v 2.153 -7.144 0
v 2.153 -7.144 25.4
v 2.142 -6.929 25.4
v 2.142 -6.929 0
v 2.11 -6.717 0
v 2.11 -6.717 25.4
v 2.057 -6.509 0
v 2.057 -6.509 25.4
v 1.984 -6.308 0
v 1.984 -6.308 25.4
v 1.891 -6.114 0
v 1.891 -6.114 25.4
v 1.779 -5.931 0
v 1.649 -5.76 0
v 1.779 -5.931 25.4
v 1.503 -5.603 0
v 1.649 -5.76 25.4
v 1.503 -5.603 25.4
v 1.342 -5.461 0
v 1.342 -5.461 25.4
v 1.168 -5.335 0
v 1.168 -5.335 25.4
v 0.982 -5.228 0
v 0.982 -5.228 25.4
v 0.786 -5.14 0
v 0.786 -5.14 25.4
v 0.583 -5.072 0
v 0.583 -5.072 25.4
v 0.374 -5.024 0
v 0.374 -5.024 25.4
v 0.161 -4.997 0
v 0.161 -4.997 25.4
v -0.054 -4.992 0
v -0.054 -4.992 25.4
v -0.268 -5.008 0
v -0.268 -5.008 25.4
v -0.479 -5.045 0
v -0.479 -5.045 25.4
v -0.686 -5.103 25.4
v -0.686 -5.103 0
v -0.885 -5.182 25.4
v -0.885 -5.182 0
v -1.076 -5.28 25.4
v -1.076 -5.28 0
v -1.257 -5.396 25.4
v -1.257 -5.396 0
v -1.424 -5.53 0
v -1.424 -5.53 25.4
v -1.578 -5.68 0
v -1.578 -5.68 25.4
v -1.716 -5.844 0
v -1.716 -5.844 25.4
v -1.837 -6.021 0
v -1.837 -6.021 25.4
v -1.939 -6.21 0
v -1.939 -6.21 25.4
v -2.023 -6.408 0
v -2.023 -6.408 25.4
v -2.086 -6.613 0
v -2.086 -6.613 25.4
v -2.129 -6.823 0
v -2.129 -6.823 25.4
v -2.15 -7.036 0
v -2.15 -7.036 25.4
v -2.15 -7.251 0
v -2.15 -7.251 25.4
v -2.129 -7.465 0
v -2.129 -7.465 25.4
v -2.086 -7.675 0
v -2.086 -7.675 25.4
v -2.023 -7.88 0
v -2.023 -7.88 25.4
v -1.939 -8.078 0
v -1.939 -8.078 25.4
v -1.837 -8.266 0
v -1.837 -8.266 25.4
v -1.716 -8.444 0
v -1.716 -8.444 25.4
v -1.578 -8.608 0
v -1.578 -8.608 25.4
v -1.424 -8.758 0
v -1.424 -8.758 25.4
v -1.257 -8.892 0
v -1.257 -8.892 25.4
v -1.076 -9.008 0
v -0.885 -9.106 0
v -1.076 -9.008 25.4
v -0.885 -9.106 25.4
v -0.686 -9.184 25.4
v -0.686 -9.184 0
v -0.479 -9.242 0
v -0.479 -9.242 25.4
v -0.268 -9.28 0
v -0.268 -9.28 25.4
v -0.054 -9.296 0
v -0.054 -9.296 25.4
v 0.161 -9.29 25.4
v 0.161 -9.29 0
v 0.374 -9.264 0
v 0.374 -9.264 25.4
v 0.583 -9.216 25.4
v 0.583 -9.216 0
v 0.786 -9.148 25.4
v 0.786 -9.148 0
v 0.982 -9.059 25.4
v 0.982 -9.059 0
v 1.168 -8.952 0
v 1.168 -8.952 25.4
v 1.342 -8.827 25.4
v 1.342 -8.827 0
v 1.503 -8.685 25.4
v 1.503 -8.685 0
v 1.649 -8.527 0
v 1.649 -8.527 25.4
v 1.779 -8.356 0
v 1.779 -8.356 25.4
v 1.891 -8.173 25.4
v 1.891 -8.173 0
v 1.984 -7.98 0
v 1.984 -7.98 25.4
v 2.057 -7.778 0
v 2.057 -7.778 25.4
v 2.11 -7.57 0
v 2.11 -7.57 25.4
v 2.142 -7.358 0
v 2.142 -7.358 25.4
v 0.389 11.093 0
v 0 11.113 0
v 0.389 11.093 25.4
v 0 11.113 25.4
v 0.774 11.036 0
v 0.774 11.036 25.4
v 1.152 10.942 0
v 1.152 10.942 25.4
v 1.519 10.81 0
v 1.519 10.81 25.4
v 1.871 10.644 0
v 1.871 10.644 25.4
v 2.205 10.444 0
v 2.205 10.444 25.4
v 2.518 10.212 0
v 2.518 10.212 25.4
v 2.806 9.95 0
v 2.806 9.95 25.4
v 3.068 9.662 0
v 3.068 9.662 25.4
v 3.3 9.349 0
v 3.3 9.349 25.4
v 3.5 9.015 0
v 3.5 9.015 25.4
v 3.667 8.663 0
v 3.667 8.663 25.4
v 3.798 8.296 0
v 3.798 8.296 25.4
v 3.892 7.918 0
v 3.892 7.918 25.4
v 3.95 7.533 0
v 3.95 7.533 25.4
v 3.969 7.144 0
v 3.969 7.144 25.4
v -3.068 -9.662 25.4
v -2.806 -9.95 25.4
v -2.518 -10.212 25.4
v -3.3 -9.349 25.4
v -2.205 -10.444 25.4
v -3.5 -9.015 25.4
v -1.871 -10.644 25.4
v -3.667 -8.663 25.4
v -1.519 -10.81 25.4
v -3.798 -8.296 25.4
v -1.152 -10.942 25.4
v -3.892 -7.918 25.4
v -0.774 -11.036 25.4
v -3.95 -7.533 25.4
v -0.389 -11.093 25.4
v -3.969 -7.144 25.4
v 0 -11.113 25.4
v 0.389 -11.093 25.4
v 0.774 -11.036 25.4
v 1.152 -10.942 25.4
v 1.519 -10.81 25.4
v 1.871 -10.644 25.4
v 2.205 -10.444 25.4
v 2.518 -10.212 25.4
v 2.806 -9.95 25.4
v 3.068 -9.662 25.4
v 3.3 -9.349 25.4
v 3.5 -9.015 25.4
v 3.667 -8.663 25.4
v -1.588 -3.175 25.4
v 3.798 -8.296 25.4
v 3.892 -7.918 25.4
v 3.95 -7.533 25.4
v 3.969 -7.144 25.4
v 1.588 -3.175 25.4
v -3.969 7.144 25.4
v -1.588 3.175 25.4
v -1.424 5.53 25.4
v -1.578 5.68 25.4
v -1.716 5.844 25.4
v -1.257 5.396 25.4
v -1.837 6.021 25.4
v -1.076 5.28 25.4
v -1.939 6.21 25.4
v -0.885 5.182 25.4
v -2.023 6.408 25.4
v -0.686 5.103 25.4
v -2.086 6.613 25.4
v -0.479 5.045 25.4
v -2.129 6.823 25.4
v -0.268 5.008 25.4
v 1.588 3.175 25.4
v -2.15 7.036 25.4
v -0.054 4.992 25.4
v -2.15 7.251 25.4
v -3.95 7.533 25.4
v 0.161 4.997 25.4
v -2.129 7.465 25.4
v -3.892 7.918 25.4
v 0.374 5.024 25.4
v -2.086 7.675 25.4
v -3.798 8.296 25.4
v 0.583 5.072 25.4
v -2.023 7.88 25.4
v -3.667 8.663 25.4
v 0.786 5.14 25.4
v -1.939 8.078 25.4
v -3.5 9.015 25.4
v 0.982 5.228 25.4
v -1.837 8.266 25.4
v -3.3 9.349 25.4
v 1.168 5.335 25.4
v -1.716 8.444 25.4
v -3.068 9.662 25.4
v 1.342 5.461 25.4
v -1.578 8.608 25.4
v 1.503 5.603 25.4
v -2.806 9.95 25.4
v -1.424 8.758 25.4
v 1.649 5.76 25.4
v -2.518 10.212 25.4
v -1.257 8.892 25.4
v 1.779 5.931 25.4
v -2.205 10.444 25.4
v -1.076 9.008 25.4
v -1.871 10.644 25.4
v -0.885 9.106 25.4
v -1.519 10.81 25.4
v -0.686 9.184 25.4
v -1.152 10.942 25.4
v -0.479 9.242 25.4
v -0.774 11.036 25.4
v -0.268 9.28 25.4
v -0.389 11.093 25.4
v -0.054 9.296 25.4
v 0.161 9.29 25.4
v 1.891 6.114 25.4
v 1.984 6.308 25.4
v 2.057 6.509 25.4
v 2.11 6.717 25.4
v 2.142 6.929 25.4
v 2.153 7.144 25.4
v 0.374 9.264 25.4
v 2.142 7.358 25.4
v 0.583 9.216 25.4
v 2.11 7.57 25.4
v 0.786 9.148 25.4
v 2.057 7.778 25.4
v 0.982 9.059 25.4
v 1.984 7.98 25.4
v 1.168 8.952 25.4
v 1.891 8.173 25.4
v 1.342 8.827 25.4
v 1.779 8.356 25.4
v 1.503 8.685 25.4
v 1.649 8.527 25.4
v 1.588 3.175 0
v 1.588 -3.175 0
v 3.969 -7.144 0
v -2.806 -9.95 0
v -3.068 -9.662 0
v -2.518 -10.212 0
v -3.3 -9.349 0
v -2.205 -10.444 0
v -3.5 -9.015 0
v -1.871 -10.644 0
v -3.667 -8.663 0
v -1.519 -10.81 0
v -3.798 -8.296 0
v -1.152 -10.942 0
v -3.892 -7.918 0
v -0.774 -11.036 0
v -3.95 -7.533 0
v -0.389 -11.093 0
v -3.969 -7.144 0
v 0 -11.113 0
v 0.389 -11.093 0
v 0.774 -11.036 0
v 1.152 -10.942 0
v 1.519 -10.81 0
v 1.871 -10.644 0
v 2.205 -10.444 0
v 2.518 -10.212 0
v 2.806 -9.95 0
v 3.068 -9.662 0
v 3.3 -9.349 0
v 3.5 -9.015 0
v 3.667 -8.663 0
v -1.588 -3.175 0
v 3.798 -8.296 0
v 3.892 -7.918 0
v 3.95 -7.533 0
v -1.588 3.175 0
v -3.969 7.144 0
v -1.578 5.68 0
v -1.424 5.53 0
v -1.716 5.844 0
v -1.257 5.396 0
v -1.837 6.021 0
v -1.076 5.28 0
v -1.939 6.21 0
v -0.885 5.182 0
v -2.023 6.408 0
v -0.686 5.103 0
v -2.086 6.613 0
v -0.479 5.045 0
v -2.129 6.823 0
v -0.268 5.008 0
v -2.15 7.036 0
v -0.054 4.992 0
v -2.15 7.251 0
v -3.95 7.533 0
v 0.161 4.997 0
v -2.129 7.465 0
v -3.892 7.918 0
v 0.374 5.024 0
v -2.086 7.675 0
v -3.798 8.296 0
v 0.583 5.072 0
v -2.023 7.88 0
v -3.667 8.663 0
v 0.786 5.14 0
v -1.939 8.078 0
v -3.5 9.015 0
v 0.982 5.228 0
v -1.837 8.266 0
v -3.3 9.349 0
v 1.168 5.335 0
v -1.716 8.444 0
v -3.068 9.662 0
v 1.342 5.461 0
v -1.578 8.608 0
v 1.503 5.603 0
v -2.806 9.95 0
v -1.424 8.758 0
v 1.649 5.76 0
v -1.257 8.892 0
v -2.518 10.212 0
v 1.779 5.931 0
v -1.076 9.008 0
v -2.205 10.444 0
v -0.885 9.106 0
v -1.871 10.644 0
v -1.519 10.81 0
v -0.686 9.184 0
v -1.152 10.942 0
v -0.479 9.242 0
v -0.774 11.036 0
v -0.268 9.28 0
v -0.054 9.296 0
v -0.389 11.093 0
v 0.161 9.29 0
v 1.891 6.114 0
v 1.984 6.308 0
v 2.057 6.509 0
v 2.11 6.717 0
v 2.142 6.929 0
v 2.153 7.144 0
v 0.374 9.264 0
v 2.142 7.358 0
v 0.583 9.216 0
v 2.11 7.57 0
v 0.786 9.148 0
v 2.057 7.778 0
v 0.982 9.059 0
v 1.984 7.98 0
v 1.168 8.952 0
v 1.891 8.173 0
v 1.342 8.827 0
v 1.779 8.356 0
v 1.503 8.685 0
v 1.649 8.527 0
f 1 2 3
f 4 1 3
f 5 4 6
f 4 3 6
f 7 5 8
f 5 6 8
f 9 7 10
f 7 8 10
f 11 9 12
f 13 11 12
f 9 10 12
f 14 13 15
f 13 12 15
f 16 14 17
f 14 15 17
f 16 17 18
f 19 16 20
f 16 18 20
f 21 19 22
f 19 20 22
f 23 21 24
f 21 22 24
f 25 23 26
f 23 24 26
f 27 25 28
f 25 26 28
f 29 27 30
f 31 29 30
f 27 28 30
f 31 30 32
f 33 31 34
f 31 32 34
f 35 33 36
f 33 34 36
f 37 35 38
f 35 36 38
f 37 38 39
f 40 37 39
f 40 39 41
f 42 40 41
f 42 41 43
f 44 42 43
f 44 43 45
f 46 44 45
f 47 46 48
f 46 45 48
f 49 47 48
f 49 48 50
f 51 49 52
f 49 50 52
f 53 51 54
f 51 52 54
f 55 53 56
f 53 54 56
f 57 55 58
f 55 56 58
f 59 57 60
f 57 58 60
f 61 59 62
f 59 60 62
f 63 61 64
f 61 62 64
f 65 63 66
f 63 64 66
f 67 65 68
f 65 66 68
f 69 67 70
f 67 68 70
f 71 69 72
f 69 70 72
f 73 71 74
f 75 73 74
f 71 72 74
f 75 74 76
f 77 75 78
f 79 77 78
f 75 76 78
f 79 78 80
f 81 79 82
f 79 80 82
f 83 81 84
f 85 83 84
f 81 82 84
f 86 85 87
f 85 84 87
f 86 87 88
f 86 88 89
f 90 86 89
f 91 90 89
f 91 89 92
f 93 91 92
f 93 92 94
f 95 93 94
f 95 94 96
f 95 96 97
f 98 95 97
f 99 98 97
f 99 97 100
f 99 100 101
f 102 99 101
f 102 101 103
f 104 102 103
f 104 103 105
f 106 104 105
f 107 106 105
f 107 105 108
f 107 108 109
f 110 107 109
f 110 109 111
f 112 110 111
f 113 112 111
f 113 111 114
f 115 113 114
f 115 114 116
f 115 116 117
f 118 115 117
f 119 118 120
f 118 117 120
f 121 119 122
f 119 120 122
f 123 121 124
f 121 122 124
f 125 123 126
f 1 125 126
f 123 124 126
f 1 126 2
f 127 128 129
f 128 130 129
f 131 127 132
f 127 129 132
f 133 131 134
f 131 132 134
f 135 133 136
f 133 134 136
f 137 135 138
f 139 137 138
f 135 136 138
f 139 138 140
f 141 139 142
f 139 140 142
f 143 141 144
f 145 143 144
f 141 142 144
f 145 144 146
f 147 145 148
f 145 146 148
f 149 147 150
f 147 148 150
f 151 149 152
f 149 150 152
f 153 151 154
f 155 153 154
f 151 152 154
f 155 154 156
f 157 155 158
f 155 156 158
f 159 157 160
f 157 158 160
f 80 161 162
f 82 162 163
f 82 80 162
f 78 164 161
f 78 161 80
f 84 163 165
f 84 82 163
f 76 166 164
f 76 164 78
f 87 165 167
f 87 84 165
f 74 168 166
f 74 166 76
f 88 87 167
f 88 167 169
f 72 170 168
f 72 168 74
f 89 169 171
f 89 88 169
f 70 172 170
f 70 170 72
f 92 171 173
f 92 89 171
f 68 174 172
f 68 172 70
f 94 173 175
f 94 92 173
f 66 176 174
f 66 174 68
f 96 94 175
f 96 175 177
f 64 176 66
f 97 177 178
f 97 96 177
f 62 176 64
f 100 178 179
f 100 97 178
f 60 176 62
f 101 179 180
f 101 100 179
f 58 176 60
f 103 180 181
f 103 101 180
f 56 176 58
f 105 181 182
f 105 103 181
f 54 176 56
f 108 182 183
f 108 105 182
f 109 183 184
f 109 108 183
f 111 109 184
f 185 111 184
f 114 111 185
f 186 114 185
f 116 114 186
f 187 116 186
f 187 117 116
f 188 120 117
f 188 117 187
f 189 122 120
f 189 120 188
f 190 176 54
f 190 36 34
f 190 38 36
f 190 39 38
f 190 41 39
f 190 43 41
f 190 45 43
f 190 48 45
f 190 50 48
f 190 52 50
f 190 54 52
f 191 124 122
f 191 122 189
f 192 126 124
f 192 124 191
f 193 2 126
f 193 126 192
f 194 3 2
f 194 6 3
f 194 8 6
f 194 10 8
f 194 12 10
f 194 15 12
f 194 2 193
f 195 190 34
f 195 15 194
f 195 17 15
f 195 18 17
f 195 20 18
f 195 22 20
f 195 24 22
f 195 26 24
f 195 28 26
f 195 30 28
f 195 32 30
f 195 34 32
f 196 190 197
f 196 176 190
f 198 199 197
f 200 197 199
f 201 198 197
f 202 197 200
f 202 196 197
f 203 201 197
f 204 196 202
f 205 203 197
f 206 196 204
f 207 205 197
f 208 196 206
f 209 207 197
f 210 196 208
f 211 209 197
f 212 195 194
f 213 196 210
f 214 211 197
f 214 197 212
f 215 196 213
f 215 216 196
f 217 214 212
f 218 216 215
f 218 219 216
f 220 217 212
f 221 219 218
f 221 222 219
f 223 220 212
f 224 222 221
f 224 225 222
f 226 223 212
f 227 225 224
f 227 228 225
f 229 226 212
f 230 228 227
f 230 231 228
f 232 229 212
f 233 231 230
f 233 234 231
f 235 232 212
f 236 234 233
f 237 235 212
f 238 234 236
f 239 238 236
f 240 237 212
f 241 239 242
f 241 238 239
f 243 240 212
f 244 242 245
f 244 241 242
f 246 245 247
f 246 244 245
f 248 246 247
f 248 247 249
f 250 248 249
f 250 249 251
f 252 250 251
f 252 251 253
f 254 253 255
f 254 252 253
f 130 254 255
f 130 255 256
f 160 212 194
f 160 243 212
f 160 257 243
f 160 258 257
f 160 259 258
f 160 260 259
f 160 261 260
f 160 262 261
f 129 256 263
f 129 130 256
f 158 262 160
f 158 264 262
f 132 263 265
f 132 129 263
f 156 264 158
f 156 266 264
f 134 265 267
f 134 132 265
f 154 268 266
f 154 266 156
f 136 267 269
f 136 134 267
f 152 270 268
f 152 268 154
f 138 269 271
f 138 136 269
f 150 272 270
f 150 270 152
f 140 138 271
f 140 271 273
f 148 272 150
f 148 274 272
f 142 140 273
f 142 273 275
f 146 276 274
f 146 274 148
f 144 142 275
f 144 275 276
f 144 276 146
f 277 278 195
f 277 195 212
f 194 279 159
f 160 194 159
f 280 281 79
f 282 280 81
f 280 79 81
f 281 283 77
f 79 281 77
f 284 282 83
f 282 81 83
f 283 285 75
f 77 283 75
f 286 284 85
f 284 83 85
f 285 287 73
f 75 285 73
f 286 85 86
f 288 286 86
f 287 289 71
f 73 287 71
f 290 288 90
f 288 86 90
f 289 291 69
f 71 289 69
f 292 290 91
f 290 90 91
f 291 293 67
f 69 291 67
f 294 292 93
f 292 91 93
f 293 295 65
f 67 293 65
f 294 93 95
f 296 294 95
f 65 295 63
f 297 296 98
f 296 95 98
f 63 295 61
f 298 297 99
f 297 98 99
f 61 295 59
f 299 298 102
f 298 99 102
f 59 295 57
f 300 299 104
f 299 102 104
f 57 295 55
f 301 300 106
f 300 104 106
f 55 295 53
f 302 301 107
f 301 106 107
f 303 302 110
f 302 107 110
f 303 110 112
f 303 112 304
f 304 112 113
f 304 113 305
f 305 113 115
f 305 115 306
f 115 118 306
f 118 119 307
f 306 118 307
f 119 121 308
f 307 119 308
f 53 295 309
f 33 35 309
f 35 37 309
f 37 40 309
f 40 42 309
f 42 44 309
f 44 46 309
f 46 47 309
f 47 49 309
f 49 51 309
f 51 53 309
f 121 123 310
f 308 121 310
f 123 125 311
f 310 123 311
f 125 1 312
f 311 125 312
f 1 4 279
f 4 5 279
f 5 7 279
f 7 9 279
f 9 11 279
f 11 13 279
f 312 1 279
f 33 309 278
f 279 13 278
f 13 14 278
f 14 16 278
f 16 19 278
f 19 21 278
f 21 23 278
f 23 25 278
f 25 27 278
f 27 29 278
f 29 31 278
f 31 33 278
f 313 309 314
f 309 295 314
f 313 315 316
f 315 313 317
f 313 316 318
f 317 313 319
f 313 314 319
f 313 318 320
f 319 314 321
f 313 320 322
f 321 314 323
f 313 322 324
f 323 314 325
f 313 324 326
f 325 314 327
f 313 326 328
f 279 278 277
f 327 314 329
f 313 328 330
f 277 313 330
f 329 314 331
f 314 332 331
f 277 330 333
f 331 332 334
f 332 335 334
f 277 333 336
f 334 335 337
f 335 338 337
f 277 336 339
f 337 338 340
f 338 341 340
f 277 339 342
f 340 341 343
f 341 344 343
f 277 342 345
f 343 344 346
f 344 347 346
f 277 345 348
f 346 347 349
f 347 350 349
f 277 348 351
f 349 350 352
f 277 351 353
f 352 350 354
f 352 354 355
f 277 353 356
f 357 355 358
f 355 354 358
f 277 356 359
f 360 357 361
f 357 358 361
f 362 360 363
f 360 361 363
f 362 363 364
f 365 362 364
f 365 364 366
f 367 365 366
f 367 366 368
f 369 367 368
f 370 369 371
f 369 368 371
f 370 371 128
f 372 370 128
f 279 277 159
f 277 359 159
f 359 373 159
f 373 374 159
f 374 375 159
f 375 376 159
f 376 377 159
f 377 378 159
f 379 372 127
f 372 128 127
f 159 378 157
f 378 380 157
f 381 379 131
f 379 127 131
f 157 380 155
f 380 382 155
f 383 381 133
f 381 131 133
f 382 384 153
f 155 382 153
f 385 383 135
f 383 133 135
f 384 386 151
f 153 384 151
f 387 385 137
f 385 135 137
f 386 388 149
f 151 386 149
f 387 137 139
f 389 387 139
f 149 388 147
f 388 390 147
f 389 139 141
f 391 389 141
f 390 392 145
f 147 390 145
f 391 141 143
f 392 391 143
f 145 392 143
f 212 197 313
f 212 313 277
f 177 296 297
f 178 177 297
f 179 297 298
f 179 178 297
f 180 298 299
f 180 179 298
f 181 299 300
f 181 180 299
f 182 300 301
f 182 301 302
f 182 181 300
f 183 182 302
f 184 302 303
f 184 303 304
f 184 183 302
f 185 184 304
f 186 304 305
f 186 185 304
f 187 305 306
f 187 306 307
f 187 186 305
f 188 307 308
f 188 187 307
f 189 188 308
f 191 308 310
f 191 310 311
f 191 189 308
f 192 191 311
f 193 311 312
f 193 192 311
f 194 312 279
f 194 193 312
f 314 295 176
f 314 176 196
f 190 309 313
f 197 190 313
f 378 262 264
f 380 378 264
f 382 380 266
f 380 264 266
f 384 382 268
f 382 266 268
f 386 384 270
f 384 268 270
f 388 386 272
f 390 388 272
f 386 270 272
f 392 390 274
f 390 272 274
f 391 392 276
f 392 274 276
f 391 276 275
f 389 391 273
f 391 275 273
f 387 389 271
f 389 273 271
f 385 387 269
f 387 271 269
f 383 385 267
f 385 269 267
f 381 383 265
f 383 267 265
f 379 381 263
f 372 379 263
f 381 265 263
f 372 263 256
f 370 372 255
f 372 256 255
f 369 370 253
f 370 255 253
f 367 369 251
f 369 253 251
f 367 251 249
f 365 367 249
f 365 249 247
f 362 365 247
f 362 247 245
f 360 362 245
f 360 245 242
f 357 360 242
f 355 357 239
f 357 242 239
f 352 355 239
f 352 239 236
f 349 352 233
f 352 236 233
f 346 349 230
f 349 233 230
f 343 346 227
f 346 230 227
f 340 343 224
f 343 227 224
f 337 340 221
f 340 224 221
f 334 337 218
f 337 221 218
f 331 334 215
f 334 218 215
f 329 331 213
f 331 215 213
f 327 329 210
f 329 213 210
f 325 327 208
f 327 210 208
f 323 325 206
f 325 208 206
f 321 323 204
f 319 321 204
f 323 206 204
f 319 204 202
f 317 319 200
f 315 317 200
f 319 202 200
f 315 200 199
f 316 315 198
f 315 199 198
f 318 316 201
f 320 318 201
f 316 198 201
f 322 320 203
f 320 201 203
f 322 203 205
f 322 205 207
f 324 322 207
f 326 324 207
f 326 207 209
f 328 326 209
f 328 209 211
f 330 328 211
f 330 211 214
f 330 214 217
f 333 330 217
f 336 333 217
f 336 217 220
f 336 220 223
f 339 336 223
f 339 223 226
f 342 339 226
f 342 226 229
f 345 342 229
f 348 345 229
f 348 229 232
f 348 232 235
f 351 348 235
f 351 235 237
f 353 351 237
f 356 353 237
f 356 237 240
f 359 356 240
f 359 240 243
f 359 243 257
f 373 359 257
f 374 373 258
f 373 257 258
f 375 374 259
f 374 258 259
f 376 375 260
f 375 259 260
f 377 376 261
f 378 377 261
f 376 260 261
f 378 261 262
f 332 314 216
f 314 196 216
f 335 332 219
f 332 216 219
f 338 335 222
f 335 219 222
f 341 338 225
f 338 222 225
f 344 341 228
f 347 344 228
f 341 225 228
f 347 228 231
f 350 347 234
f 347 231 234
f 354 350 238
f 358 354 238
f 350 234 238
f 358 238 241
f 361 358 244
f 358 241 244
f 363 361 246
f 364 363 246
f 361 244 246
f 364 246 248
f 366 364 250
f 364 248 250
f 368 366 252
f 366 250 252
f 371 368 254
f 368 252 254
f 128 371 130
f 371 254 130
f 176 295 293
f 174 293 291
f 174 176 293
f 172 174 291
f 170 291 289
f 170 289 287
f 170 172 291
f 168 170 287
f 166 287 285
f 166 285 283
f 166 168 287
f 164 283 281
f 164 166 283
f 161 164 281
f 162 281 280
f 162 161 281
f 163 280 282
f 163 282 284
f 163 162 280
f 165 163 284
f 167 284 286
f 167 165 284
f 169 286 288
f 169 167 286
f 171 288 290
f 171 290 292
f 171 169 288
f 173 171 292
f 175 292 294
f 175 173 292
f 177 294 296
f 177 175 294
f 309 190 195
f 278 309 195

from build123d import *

# Parameters (mm, degrees)
F0_W     = 7.9375
F0_H     = 22.225
F0_W_2   = 3.175
F0_H_2   = 6.35
F1_DEPTH = 25.4
F2_R     = 2.15265
F3_DEPTH = 25.4
F4_R     = 3.96874


# Not quite as in the source:
# - a fillet or chamfer is up to 0.001 mm smaller than in the source, because OpenCascade refuses the exact size


with BuildPart() as f1:
    # F0 (on Top) → F1 (new body)
    with BuildSketch(Plane.XY):
        Rectangle(F0_W, F0_H)
        Rectangle(F0_W_2, F0_H_2, mode=Mode.SUBTRACT)
    extrude(amount=F1_DEPTH)

    # F2 (on face) → F3 (cut, through all)
    with BuildSketch(Plane.XY.offset(25.4)):
        with Locations((0, 7.14375)):
            Circle(F2_R)
        with Locations((0, -7.14375)):
            Circle(F2_R)
    extrude(amount=-F3_DEPTH, mode=Mode.SUBTRACT)

    # F4 (radius 3.96875 in the source; OpenCascade refuses exactly that, so slightly less here)
    f4_edges = [f1.edges().sort_by_distance(p)[0] for p in [
        (-3.96875, -11.1125, 12.7),
        (3.96875, -11.1125, 12.7),
        (3.96875, 11.1125, 12.7),
        (-3.96875, 11.1125, 12.7),
    ]]
    fillet(f4_edges, radius=F4_R)


solid = f1.part
